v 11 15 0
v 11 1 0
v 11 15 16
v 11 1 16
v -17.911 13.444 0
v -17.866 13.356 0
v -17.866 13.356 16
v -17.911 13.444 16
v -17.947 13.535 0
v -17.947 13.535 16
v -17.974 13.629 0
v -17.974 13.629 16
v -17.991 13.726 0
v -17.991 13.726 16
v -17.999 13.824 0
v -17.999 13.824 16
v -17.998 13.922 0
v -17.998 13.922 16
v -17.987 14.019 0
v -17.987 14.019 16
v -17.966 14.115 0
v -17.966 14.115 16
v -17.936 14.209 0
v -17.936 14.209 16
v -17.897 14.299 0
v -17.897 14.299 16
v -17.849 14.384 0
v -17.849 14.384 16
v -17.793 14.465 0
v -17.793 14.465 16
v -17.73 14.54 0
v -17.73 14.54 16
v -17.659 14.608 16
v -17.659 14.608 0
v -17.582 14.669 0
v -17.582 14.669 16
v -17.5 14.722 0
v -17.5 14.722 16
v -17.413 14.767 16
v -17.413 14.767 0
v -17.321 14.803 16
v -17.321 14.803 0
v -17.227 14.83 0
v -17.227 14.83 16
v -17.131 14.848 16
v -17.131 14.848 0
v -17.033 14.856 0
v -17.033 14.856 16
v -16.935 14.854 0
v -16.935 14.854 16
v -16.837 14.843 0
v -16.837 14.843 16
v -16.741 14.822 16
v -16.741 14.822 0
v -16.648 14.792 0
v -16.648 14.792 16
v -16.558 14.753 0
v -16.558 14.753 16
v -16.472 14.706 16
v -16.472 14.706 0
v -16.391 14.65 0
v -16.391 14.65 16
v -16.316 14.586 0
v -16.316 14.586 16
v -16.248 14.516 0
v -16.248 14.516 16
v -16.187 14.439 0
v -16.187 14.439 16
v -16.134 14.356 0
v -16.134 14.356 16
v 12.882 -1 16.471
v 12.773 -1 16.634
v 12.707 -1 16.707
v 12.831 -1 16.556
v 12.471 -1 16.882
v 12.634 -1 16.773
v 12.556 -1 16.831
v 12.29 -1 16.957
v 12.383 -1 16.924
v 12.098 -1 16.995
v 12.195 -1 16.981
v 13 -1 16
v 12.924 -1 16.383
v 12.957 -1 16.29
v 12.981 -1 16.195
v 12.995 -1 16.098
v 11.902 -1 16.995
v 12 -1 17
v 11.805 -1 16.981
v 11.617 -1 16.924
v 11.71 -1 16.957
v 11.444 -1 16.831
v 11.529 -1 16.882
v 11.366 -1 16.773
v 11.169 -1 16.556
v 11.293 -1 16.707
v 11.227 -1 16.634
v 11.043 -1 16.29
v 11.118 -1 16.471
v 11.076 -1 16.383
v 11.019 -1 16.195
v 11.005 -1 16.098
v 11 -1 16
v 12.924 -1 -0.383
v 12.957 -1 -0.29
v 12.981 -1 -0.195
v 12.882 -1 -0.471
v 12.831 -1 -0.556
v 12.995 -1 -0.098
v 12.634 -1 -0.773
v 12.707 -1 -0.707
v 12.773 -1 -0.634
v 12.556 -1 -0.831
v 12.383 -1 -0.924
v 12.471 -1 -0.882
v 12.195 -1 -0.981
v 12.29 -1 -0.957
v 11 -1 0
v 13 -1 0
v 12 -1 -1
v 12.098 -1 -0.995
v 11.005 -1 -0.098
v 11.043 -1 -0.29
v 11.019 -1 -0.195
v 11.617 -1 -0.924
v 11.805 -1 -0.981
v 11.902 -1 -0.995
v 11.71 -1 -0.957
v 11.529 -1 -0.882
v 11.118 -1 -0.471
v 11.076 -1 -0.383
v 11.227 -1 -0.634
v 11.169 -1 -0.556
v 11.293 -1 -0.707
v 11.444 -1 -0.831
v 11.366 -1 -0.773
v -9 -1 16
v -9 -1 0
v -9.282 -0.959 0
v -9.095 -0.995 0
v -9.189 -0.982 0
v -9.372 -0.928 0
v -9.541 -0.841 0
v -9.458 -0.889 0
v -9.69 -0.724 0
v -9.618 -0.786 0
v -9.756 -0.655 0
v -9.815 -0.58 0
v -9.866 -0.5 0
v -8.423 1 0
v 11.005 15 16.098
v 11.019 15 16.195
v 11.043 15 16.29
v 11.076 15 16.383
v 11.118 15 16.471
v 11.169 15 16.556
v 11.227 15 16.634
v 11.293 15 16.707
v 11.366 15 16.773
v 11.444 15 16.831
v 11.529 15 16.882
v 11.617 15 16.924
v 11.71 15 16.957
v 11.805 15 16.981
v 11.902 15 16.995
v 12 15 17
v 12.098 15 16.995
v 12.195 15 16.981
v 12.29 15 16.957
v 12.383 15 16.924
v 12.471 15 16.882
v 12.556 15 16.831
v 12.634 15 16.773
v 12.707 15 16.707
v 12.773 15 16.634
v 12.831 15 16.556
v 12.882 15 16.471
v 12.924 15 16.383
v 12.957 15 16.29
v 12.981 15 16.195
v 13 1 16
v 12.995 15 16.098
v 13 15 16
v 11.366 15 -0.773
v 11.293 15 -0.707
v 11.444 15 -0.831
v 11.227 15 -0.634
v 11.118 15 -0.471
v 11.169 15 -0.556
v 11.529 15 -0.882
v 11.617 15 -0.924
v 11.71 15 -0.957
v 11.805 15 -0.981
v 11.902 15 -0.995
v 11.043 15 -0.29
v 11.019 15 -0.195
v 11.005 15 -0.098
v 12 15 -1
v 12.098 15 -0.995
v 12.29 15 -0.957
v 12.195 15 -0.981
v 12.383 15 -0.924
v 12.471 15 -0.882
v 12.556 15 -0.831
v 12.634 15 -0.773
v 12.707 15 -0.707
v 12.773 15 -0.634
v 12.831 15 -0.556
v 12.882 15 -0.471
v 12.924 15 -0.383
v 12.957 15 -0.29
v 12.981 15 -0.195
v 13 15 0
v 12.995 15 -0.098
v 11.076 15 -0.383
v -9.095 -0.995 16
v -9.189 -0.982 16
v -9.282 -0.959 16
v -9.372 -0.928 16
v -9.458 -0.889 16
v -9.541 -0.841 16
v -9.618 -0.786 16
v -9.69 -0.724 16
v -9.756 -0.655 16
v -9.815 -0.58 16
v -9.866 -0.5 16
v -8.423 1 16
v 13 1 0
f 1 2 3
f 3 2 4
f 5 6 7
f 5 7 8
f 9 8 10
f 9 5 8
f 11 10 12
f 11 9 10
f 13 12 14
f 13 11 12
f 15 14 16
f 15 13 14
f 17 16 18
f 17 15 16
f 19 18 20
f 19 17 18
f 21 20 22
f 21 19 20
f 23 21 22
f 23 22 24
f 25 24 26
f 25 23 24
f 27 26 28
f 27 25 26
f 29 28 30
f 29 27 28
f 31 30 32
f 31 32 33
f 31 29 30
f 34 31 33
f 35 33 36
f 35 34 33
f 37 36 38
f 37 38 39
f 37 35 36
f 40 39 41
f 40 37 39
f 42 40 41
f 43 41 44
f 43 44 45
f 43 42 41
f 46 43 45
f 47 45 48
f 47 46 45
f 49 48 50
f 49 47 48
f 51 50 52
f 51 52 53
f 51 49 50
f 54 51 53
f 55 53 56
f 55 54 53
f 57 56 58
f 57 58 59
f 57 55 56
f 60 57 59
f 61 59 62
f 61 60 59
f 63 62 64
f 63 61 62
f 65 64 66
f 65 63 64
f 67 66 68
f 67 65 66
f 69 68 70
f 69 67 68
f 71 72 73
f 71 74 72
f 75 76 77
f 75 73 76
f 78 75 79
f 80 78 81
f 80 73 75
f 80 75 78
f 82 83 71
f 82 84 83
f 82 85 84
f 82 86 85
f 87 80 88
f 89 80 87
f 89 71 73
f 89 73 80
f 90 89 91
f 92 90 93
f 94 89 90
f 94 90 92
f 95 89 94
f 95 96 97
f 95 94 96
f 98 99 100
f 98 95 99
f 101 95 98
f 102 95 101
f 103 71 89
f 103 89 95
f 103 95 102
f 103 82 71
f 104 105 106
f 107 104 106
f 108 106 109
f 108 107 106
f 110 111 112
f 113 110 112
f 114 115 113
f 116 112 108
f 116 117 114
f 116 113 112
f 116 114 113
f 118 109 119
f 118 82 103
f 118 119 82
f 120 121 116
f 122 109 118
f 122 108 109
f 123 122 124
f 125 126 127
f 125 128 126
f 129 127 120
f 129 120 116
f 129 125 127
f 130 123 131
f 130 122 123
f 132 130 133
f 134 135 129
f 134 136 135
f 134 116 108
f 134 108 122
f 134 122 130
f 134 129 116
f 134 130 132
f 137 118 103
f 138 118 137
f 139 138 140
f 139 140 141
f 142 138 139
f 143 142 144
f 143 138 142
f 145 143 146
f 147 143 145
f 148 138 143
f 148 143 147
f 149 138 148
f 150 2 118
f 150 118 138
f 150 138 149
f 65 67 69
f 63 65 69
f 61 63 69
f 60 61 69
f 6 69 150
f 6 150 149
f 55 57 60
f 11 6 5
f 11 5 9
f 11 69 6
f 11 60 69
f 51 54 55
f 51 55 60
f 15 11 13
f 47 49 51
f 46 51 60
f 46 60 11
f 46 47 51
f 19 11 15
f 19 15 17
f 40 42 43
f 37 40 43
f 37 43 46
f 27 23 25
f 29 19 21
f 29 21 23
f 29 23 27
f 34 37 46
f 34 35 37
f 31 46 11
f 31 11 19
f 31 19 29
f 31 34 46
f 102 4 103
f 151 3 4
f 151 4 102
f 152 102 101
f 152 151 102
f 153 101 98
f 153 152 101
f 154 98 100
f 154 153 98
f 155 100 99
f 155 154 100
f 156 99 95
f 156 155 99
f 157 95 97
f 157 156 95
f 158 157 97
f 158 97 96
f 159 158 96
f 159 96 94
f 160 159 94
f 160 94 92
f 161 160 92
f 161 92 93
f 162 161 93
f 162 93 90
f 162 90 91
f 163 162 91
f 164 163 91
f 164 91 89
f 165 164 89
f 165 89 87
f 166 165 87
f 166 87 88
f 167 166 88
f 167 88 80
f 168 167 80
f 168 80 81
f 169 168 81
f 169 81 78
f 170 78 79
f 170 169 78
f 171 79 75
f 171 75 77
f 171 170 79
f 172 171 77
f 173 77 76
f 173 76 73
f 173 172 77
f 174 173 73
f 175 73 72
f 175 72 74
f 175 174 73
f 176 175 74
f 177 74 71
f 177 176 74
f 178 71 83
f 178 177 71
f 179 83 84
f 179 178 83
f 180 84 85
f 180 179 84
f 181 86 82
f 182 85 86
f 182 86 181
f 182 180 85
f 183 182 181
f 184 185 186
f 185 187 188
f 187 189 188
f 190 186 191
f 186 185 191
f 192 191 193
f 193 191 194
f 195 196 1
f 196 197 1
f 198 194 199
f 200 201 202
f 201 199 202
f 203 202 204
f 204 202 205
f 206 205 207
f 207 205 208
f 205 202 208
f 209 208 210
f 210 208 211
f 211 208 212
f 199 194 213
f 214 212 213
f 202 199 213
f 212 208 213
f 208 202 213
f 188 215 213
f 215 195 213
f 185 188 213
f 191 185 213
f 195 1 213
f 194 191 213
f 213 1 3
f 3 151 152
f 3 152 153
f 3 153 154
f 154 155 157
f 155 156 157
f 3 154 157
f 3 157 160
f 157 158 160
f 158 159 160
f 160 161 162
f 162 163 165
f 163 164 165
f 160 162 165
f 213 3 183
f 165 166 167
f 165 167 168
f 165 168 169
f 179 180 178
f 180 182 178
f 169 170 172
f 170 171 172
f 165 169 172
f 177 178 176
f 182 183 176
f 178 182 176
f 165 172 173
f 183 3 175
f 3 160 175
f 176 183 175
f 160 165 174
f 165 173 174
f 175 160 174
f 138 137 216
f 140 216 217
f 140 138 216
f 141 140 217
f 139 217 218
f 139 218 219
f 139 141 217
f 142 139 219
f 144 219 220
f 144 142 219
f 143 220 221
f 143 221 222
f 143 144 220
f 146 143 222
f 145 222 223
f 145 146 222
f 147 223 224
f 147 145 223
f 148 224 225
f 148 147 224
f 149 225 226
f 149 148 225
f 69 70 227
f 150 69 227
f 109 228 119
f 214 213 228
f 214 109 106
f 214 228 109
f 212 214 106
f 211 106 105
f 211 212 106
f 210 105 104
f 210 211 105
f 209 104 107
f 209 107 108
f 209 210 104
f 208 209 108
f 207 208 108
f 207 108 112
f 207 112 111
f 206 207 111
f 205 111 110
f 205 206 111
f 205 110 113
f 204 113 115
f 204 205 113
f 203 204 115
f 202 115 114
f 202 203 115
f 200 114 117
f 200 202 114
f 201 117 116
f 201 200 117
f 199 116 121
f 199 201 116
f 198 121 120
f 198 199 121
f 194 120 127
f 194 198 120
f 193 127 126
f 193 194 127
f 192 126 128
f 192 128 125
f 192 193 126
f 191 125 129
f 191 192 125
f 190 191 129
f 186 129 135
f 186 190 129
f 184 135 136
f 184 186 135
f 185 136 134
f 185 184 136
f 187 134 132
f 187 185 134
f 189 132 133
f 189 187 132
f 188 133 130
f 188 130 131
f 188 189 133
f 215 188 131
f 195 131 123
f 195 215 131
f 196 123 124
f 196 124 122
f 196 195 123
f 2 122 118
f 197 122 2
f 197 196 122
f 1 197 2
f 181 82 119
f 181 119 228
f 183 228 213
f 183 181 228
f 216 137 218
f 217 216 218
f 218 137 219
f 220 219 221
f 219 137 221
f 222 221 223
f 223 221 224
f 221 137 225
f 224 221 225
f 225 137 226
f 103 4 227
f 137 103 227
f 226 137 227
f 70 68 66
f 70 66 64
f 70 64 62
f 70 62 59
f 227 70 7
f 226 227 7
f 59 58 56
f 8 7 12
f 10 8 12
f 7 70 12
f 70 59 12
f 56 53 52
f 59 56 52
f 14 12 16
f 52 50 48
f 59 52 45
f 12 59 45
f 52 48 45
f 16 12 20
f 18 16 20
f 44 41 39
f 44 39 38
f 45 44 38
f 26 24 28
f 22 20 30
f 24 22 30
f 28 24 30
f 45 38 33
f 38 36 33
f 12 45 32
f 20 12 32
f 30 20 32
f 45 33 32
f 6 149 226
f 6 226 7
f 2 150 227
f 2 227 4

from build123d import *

# Parameters (mm, degrees)
EXTRUDE_9_DEPTH     = 16
SKETCH_12_W         = 3.587626489
SKETCH_12_H         = 2.400728999
CUT_EXTRUDE_2_DEPTH = 16
SKETCH_17_W         = 2
SKETCH_17_H         = 16
EXTRUDE_15_DEPTH    = 16
SKETCH_18_R         = 1
EXTRUDE_16_DEPTH    = 16


with BuildPart() as part:
    # 草图10 → 凸台-拉伸9 (new body)
    with BuildSketch(Plane.XY):
        with BuildLine():
            Line((-8.422649731, 1), (9, 1))
            Line((9, 1), (16.587626489, 1))
            Line((16.587626489, 1), (16.587626489, -1))
            Line((16.587626489, -1), (9, -1))
            Line((9, -1), (-9, -1))
            ThreePointArc((-9, -1), (-9.5, -0.866025404), (-9.866025404, -0.5))
            Line((-9.866025404, -0.5), (-17.866025404, 13.356406461))
            ThreePointArc((-17.866025404, 13.356406461), (-17.5, 14.722431864), (-16.133974596, 14.356406461))
            Line((-16.133974596, 14.356406461), (-8.422649731, 1))
        make_face()
    extrude(amount=EXTRUDE_9_DEPTH)

    # 草图12 → 切除-拉伸2 (cut)
    with BuildSketch(Plane.XY.offset(16)):
        with Locations((14.793813245, -0.2003645)):
            Rectangle(SKETCH_12_W, SKETCH_12_H)
    extrude(amount=-CUT_EXTRUDE_2_DEPTH, mode=Mode.SUBTRACT)

    # 草图17 → 凸台-拉伸15 (add)
    with BuildSketch(Plane.XZ.offset(1)):
        with Locations((12, 8)):
            Rectangle(SKETCH_17_W, SKETCH_17_H)
    extrude(amount=-EXTRUDE_15_DEPTH)

    # 草图18 → 凸台-拉伸16 (add)
    with BuildSketch(Plane(origin=(0, 15, 0), x_dir=(1, 0, 0), z_dir=(0, 1, 0))):
        with Locations((12, 0)):
            Circle(SKETCH_18_R)
        with Locations((12, -16)):
            Circle(SKETCH_18_R)
    extrude(amount=-EXTRUDE_16_DEPTH)


solid = part.part
